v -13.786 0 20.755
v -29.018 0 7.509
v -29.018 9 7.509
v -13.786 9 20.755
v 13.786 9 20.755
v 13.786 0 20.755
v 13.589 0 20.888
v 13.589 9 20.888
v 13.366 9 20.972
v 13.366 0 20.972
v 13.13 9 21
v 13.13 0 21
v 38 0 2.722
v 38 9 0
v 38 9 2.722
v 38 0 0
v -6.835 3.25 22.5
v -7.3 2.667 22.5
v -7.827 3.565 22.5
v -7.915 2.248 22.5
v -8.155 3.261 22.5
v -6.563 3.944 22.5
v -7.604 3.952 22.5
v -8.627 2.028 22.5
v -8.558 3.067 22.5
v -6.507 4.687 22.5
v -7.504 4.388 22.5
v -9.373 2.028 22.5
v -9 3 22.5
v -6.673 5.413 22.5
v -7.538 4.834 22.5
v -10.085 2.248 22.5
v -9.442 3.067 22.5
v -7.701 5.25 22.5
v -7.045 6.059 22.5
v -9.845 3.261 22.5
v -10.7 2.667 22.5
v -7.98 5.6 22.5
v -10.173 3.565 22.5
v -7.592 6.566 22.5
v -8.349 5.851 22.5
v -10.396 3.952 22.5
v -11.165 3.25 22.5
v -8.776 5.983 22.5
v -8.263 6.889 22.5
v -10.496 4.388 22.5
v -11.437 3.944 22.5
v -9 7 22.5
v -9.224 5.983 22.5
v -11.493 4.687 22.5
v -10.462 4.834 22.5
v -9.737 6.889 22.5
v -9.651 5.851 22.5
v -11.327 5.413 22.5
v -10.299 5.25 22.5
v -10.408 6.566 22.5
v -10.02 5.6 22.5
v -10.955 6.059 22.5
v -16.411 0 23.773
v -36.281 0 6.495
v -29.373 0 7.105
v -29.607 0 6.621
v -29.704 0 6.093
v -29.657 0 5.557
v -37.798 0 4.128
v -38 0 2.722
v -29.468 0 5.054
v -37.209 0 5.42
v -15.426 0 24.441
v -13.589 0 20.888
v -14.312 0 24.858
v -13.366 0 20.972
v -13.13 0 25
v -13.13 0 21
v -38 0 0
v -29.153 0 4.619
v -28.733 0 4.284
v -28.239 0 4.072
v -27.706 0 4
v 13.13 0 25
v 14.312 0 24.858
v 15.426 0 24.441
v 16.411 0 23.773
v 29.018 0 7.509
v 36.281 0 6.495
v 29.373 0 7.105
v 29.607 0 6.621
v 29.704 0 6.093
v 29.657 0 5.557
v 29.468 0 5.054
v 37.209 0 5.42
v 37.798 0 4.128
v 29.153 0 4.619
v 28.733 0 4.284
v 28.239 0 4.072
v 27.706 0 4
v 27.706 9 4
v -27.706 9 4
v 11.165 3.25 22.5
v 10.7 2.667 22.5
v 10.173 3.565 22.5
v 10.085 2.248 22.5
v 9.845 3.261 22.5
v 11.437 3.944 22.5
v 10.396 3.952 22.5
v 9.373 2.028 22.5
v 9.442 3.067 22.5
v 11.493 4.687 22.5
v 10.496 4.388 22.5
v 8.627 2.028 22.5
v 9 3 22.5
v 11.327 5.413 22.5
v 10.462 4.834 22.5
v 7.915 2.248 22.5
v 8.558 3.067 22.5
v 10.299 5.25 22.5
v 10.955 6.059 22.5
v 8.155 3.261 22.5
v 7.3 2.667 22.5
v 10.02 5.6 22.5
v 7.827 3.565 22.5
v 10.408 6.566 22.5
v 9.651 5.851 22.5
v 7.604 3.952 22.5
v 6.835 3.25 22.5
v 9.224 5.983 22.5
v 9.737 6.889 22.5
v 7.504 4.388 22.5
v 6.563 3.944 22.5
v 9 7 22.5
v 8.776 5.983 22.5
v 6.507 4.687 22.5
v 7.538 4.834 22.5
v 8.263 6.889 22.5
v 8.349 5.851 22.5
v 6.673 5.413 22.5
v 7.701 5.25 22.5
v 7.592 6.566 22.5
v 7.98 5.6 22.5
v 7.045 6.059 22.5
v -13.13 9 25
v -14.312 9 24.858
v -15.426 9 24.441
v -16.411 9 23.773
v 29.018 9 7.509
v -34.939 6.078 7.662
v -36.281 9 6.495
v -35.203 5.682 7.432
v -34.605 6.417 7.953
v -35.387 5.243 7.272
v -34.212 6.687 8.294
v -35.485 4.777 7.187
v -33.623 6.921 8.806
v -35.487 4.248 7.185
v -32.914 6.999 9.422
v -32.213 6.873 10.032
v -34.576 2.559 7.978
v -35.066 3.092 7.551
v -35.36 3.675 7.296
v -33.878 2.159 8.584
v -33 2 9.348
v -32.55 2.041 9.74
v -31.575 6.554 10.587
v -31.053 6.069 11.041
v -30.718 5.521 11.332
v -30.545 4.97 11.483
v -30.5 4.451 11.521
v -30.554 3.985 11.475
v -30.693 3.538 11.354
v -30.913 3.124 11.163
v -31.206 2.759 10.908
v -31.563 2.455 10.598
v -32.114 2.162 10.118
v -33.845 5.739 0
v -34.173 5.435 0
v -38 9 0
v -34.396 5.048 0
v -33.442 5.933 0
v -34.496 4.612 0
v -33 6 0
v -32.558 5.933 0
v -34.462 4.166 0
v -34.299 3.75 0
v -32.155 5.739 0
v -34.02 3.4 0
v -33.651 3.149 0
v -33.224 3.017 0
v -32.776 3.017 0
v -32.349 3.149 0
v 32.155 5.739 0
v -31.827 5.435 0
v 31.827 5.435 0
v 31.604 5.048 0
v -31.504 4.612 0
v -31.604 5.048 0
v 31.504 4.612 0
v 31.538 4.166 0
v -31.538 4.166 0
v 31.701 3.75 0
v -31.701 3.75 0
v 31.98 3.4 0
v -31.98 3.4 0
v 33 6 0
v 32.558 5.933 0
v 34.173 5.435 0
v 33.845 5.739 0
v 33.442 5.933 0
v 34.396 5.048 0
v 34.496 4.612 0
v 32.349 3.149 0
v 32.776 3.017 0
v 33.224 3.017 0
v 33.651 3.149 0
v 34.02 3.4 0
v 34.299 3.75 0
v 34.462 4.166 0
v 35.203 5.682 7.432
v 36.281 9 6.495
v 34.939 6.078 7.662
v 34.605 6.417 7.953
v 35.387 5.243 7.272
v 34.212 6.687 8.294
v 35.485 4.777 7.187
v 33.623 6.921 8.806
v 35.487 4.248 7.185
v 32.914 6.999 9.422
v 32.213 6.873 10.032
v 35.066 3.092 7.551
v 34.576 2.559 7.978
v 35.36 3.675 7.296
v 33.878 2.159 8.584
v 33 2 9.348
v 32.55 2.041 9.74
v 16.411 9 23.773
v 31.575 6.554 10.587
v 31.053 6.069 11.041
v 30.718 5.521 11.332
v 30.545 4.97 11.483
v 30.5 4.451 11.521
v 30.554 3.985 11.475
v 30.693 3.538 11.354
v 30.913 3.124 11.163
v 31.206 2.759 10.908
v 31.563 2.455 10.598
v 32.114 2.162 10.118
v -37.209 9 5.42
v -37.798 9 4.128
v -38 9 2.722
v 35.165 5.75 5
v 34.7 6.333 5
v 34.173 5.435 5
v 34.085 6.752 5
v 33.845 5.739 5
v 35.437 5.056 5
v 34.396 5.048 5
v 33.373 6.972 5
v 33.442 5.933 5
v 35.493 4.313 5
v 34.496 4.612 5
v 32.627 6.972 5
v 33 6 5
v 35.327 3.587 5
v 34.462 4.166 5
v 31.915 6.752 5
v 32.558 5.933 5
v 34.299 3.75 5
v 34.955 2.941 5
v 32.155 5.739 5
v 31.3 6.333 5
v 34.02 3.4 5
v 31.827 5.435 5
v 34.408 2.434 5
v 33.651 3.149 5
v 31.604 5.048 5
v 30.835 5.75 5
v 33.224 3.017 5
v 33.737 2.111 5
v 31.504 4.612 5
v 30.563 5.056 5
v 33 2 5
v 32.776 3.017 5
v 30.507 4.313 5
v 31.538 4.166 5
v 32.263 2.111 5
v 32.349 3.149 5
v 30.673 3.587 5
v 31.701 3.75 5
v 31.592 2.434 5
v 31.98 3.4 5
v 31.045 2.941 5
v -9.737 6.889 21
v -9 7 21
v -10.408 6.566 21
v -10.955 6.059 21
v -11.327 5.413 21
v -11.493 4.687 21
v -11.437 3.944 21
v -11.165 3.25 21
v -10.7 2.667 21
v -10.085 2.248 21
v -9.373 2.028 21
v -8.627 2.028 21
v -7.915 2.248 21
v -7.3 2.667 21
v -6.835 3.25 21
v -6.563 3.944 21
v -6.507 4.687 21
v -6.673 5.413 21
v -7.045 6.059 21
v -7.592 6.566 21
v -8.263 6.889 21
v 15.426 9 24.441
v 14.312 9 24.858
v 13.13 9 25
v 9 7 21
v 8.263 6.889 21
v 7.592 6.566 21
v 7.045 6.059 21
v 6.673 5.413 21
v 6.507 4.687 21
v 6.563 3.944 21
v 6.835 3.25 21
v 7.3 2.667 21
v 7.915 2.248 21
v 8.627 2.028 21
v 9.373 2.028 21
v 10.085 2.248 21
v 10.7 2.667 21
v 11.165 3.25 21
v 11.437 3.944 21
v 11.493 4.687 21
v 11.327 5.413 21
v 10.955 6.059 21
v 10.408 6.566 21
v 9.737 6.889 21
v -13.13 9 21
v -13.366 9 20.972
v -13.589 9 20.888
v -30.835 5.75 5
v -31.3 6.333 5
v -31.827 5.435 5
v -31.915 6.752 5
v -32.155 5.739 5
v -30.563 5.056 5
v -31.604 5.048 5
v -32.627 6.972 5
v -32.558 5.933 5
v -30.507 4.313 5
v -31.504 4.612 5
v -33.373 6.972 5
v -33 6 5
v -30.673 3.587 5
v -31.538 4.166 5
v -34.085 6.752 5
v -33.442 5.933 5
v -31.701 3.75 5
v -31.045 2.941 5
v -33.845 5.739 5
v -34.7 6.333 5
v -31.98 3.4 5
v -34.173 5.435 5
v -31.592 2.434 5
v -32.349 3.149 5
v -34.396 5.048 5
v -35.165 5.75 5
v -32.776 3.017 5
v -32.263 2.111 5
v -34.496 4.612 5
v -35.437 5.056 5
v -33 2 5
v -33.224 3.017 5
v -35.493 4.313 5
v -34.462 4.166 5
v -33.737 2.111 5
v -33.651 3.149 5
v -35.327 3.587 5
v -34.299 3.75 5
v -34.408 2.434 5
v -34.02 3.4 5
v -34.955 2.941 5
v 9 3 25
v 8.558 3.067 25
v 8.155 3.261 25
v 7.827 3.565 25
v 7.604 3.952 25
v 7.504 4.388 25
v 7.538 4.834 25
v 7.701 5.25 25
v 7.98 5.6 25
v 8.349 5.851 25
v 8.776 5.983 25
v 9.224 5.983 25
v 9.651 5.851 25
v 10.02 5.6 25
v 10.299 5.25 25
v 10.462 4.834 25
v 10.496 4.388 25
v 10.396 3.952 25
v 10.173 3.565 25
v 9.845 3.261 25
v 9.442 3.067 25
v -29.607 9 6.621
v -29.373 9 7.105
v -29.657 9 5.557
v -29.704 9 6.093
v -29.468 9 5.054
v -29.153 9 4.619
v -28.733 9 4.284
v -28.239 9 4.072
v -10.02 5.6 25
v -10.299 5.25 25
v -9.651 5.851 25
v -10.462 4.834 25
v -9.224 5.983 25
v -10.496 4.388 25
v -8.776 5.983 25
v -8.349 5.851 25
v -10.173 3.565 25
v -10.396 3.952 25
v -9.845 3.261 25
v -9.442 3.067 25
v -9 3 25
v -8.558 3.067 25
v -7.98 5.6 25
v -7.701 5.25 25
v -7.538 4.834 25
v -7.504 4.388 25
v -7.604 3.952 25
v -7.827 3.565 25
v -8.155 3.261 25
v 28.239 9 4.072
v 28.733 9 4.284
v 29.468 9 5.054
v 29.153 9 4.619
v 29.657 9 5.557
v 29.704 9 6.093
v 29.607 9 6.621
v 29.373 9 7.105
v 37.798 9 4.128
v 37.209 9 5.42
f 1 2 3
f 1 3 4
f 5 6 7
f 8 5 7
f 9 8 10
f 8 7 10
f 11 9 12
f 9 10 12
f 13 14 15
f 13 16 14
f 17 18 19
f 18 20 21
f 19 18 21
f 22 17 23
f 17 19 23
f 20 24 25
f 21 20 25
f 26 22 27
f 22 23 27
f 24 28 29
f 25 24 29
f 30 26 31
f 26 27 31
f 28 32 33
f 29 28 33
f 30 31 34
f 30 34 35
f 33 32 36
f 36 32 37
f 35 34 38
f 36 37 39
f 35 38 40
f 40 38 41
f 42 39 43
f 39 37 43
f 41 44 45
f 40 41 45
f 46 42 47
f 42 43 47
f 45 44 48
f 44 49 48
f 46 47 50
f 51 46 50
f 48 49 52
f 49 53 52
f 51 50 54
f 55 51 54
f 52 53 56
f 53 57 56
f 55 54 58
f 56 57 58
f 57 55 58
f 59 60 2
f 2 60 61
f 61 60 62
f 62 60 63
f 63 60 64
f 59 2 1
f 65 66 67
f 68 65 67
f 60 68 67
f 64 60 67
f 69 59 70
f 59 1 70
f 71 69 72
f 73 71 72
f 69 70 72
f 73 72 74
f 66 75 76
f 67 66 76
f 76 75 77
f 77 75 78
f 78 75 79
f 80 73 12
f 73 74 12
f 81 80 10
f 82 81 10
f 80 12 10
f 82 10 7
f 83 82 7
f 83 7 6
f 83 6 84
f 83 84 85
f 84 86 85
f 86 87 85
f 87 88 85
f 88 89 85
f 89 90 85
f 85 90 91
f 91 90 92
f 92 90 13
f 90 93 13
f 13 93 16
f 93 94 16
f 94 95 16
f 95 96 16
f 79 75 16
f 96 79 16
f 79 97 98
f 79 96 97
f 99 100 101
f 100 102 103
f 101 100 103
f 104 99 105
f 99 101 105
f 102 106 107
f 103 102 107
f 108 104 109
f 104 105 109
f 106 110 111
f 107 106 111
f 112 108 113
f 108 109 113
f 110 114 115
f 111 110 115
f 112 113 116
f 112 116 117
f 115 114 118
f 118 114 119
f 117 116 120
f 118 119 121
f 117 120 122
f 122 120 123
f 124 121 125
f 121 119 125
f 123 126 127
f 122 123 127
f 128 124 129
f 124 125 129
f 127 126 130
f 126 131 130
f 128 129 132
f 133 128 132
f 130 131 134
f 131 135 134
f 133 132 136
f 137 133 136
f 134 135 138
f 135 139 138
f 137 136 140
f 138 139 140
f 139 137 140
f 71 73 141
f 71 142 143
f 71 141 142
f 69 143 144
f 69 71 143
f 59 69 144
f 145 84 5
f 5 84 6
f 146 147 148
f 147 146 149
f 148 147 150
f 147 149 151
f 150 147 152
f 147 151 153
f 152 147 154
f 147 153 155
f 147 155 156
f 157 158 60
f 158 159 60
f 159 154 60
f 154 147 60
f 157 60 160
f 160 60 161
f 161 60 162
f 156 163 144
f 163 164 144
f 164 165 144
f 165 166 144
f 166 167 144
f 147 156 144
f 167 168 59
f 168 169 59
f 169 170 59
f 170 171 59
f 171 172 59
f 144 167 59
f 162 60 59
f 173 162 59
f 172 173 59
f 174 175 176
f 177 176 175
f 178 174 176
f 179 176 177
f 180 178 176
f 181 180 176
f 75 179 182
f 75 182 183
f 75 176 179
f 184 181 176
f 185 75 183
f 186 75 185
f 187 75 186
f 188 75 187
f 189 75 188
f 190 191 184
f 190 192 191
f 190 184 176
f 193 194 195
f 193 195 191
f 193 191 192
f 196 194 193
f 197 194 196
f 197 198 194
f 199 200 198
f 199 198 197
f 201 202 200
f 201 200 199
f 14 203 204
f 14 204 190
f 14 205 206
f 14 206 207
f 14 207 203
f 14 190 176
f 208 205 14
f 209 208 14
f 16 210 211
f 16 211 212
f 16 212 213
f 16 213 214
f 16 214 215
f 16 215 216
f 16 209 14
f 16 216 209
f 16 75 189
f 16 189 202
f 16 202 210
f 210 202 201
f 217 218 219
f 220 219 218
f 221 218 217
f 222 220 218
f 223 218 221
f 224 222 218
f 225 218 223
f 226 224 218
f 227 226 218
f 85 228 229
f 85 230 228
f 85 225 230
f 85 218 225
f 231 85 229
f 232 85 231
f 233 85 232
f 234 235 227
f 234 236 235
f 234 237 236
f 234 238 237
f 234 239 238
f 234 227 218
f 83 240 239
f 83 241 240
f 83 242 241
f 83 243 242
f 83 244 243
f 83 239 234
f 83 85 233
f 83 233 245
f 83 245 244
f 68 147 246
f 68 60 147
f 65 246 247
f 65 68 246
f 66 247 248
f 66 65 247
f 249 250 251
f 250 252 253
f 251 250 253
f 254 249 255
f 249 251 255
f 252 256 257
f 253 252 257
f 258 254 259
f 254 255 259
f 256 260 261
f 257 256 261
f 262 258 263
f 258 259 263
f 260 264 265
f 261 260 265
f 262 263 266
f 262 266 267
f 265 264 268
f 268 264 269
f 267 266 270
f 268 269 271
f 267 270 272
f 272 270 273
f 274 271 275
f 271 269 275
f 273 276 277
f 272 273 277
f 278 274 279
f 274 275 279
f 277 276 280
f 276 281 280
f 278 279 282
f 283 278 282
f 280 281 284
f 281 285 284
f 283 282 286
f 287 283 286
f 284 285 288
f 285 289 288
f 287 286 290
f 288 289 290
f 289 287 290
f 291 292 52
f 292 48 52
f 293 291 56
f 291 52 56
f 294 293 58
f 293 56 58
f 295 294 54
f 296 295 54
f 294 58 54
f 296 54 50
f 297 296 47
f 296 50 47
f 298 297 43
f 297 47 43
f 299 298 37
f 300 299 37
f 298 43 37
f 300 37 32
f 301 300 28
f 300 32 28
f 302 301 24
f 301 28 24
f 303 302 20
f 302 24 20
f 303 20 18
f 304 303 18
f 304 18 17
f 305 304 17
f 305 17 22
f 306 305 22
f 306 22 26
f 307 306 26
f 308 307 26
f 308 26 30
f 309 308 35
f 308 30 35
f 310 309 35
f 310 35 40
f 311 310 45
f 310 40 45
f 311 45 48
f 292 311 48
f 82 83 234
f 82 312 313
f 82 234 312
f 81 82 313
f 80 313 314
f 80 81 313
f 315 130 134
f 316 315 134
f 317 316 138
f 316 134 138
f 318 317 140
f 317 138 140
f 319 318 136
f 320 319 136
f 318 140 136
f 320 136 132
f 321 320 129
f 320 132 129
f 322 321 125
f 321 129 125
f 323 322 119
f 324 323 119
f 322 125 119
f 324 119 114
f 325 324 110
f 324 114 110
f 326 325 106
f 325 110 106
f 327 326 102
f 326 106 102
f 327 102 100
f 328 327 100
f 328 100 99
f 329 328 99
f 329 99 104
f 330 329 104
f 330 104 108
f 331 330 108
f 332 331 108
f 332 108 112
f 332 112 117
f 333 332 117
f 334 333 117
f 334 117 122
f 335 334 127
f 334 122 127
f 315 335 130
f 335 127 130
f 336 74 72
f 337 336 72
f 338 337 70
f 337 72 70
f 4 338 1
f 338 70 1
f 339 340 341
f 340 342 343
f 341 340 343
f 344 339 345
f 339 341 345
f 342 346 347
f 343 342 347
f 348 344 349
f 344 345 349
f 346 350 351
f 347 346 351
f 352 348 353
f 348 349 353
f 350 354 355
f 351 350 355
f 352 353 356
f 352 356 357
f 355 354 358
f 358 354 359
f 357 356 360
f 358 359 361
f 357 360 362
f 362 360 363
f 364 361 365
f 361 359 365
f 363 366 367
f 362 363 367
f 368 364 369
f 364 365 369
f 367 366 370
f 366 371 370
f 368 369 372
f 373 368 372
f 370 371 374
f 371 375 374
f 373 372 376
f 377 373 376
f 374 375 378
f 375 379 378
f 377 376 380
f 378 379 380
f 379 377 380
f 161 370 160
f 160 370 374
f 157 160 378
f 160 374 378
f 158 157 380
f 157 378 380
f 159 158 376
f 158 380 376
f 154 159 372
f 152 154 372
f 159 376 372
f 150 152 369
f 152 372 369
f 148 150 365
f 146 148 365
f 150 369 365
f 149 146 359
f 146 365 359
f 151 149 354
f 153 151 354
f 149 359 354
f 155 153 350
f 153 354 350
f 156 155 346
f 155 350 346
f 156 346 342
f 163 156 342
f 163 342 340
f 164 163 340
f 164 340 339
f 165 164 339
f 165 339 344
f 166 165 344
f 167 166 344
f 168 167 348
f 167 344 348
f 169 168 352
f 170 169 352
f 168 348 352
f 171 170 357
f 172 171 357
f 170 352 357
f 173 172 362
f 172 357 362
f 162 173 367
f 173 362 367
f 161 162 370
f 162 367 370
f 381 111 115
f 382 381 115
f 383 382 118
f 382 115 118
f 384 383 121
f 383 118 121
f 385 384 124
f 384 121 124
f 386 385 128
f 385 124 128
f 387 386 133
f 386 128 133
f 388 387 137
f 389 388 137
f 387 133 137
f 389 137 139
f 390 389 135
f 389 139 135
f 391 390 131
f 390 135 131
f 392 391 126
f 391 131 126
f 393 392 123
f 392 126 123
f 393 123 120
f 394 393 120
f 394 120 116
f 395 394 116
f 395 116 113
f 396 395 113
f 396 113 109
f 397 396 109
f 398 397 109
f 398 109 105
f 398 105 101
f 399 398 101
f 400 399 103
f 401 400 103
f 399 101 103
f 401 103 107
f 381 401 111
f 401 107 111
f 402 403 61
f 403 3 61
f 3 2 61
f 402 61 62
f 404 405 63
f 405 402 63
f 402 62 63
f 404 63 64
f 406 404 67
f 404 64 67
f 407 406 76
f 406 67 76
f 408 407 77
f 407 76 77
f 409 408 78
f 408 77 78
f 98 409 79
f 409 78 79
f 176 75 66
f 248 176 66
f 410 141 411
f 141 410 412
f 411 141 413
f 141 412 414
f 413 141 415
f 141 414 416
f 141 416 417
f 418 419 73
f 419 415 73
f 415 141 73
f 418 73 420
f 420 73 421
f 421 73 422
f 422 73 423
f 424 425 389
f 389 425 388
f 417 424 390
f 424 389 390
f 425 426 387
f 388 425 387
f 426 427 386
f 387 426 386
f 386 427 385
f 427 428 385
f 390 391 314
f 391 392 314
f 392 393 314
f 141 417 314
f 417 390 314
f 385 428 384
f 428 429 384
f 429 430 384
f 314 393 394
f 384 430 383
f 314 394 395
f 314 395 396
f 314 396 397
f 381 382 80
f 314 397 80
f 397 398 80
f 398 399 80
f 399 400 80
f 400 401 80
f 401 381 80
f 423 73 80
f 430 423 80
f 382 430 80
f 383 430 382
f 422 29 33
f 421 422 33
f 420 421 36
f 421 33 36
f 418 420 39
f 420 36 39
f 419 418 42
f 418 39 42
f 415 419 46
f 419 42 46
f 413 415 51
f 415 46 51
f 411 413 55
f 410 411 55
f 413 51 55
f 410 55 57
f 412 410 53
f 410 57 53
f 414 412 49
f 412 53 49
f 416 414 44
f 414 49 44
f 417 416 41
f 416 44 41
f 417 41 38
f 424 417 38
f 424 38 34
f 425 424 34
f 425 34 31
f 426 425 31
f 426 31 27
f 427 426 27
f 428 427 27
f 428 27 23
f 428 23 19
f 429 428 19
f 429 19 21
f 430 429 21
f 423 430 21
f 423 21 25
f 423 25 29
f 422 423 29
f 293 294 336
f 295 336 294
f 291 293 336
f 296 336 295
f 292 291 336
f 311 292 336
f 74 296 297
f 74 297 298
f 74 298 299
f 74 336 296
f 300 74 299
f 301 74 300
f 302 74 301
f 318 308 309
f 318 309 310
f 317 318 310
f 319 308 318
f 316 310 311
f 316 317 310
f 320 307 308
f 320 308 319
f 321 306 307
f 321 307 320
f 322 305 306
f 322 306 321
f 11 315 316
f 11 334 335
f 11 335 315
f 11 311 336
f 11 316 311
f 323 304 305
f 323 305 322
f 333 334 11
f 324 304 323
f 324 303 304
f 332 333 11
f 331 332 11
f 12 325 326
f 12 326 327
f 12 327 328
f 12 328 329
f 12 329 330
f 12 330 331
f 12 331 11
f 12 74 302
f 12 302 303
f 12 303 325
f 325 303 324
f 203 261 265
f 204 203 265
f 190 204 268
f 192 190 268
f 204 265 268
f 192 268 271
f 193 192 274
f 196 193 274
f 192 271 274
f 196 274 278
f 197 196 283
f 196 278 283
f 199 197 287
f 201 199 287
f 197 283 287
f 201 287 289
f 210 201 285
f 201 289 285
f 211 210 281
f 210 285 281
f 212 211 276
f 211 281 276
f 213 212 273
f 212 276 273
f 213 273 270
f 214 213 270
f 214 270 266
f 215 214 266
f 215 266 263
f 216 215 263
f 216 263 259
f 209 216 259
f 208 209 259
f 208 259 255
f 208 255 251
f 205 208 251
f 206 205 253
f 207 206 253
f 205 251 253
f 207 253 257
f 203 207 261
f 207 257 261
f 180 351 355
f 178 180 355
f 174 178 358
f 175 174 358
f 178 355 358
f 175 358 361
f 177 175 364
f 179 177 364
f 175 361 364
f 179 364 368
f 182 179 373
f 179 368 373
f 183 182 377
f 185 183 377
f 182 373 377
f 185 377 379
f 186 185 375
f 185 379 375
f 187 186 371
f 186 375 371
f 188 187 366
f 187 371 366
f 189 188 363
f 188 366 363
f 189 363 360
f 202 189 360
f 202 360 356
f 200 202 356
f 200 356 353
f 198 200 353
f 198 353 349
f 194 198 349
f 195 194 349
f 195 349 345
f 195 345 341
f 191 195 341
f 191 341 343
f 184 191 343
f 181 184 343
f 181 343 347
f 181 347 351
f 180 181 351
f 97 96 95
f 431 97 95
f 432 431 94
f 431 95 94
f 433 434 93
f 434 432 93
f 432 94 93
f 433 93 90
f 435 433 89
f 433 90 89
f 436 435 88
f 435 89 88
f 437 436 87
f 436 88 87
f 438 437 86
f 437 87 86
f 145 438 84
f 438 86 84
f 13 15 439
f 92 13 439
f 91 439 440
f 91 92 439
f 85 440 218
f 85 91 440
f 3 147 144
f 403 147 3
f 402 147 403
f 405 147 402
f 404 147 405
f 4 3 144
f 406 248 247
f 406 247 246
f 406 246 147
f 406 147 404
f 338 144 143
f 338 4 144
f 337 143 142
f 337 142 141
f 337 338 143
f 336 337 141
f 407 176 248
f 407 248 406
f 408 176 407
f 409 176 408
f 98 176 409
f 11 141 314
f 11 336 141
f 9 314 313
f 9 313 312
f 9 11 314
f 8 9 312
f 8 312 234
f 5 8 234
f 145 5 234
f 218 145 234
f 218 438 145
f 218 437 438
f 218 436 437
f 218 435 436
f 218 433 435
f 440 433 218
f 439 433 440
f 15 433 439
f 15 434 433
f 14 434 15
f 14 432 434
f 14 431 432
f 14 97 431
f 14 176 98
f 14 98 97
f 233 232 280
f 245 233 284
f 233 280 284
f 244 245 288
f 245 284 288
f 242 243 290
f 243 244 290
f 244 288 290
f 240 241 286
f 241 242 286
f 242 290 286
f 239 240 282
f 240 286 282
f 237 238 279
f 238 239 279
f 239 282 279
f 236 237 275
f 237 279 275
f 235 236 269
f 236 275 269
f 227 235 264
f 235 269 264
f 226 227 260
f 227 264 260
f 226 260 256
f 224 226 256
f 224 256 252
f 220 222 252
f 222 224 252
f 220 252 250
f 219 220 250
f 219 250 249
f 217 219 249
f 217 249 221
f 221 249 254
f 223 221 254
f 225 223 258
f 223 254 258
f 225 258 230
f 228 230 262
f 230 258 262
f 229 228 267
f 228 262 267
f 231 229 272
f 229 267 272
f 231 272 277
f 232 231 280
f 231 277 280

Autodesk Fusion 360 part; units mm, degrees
sketch "Sketch1" plane through (0, 0, 0) normal (0, 1, 0) x (1, 0, 0)
  line L0 (0, 0) -> (-33, 0)
  line L1 (0, 0) -> (33, 0)
  line L2 (-33, 0) -> (-38, 0)
  line L3 (33, 0) -> (38, 0)
  line L4 (-38, 0) -> (-38, -2.7218)
  line L5 (-36.2809, -6.4949) -> (-16.411, -23.773)
  line L6 (-13.1301, -25) -> (13.1301, -25)
  line L7 (38, 0) -> (38, -2.7218)
  line L8 (36.2809, -6.4949) -> (16.411, -23.773)
  arc A0 (-38, -2.7218) -> (-36.2809, -6.4949) centre (-33, -2.7218) ccw
  arc A1 (36.2809, -6.4949) -> (38, -2.7218) centre (33, -2.7218) ccw
  arc A2 (13.1301, -25) -> (16.411, -23.773) centre (13.1301, -20) ccw
  arc A3 (-16.411, -23.773) -> (-13.1301, -25) centre (-13.1301, -20) ccw
  line L9 (0, -4) -> (27.7062, -4)
  line L10 (33, -4) -> (33.0541, -4)
  line L11 (29.0185, -7.5092) -> (13.7863, -20.7546)
  arc A4 (13.1301, -21) -> (13.7863, -20.7546) centre (13.1301, -20) ccw
  line L12 (-13.1301, -21) -> (13.1301, -21)
  arc A5 (-13.7863, -20.7546) -> (-13.1301, -21) centre (-13.1301, -20) ccw
  line L13 (-29.0185, -7.5092) -> (-13.7863, -20.7546)
  line L14 (-33, -4) -> (-33.0541, -4)
  line L15 (0, -4) -> (-27.7062, -4)
  arc A6 (-27.7062, -4) -> (-29.0185, -7.5092) centre (-27.7062, -6) ccw
  arc A7 (29.0185, -7.5092) -> (27.7062, -4) centre (27.7062, -6) ccw
  dimension "d2" = 5
  dimension "d3" = 2
  dimension "d4" = 2
extrude "Extrude1" add sketch "Sketch1" along normal blind 9
sketch "Sketch2" plane through (0, 0, 0) normal (0, 0, -1) x (-1, 0, 0)
  line L0 (-38, 0) -> (38, 0)
  line L1 (38, 0) -> (38, 9)
  line L2 (38, 9) -> (-38, 9)
  line L3 (-38, 9) -> (-38, 0)
  line L4 (0, 0) -> (0, 9)
  line L5 (0, 4.5) -> (-33, 4.5)
  line L6 (0, 4.5) -> (33, 4.5)
  dimension "d7" = 33
  dimension "d8" = 33
hole "Hole1" at (33, 4.5, 0) at (-33, 4.5, 0) direction (0, 0, 1) diameter 3 depth 122 tip angle 180
sketch "Sketch3" plane through (0, 0, 25) normal (0, 0, 1) x (1, 0, 0)
  line L0 (-13.1301, 0) -> (13.1301, 0)
  line L1 (13.1301, 0) -> (13.1301, 9)
  line L2 (13.1301, 9) -> (-13.1301, 9)
  line L3 (-13.1301, 9) -> (-13.1301, 0)
  line L4 (0, 0) -> (0, 9)
  line L5 (0, 4.5) -> (-33, 4.5)
  line L6 (0, 4.5) -> (33, 4.5)
  dimension "d12" = 33
  dimension "d13" = 33
hole "Hole2" at (33, 4.5, 25) at (-33, 4.5, 25) direction (0, 0, -1) diameter 5 depth 20 tip angle 180
sketch "Sketch4" plane through (0, 0, 25) normal (0, 0, 1) x (1, 0, 0)
  line L0 (-13.1301, 0) -> (13.1301, 0)
  line L1 (13.1301, 0) -> (13.1301, 9)
  line L2 (13.1301, 9) -> (-13.1301, 9)
  line L3 (-13.1301, 9) -> (-13.1301, 0)
  line L4 (0, 4.5) -> (-9, 4.5)
  line L5 (-9, 4.5) -> (9, 4.5)
  curve L6
  curve L7
  curve L8
  curve L9
  curve L10
  curve L11
  dimension "d20" = 4.5
  dimension "d21" = 9
  dimension "d22" = 9
hole "Hole4" at (9, 4.5, 21) at (-9, 4.5, 21) direction (0, 0, 1) diameter 5 depth 1.5 tip angle 180
hole "Hole3" at (-9, 4.5, 25) at (9, 4.5, 25) direction (0, 0, -1) diameter 3 depth 20 tip angle 180
